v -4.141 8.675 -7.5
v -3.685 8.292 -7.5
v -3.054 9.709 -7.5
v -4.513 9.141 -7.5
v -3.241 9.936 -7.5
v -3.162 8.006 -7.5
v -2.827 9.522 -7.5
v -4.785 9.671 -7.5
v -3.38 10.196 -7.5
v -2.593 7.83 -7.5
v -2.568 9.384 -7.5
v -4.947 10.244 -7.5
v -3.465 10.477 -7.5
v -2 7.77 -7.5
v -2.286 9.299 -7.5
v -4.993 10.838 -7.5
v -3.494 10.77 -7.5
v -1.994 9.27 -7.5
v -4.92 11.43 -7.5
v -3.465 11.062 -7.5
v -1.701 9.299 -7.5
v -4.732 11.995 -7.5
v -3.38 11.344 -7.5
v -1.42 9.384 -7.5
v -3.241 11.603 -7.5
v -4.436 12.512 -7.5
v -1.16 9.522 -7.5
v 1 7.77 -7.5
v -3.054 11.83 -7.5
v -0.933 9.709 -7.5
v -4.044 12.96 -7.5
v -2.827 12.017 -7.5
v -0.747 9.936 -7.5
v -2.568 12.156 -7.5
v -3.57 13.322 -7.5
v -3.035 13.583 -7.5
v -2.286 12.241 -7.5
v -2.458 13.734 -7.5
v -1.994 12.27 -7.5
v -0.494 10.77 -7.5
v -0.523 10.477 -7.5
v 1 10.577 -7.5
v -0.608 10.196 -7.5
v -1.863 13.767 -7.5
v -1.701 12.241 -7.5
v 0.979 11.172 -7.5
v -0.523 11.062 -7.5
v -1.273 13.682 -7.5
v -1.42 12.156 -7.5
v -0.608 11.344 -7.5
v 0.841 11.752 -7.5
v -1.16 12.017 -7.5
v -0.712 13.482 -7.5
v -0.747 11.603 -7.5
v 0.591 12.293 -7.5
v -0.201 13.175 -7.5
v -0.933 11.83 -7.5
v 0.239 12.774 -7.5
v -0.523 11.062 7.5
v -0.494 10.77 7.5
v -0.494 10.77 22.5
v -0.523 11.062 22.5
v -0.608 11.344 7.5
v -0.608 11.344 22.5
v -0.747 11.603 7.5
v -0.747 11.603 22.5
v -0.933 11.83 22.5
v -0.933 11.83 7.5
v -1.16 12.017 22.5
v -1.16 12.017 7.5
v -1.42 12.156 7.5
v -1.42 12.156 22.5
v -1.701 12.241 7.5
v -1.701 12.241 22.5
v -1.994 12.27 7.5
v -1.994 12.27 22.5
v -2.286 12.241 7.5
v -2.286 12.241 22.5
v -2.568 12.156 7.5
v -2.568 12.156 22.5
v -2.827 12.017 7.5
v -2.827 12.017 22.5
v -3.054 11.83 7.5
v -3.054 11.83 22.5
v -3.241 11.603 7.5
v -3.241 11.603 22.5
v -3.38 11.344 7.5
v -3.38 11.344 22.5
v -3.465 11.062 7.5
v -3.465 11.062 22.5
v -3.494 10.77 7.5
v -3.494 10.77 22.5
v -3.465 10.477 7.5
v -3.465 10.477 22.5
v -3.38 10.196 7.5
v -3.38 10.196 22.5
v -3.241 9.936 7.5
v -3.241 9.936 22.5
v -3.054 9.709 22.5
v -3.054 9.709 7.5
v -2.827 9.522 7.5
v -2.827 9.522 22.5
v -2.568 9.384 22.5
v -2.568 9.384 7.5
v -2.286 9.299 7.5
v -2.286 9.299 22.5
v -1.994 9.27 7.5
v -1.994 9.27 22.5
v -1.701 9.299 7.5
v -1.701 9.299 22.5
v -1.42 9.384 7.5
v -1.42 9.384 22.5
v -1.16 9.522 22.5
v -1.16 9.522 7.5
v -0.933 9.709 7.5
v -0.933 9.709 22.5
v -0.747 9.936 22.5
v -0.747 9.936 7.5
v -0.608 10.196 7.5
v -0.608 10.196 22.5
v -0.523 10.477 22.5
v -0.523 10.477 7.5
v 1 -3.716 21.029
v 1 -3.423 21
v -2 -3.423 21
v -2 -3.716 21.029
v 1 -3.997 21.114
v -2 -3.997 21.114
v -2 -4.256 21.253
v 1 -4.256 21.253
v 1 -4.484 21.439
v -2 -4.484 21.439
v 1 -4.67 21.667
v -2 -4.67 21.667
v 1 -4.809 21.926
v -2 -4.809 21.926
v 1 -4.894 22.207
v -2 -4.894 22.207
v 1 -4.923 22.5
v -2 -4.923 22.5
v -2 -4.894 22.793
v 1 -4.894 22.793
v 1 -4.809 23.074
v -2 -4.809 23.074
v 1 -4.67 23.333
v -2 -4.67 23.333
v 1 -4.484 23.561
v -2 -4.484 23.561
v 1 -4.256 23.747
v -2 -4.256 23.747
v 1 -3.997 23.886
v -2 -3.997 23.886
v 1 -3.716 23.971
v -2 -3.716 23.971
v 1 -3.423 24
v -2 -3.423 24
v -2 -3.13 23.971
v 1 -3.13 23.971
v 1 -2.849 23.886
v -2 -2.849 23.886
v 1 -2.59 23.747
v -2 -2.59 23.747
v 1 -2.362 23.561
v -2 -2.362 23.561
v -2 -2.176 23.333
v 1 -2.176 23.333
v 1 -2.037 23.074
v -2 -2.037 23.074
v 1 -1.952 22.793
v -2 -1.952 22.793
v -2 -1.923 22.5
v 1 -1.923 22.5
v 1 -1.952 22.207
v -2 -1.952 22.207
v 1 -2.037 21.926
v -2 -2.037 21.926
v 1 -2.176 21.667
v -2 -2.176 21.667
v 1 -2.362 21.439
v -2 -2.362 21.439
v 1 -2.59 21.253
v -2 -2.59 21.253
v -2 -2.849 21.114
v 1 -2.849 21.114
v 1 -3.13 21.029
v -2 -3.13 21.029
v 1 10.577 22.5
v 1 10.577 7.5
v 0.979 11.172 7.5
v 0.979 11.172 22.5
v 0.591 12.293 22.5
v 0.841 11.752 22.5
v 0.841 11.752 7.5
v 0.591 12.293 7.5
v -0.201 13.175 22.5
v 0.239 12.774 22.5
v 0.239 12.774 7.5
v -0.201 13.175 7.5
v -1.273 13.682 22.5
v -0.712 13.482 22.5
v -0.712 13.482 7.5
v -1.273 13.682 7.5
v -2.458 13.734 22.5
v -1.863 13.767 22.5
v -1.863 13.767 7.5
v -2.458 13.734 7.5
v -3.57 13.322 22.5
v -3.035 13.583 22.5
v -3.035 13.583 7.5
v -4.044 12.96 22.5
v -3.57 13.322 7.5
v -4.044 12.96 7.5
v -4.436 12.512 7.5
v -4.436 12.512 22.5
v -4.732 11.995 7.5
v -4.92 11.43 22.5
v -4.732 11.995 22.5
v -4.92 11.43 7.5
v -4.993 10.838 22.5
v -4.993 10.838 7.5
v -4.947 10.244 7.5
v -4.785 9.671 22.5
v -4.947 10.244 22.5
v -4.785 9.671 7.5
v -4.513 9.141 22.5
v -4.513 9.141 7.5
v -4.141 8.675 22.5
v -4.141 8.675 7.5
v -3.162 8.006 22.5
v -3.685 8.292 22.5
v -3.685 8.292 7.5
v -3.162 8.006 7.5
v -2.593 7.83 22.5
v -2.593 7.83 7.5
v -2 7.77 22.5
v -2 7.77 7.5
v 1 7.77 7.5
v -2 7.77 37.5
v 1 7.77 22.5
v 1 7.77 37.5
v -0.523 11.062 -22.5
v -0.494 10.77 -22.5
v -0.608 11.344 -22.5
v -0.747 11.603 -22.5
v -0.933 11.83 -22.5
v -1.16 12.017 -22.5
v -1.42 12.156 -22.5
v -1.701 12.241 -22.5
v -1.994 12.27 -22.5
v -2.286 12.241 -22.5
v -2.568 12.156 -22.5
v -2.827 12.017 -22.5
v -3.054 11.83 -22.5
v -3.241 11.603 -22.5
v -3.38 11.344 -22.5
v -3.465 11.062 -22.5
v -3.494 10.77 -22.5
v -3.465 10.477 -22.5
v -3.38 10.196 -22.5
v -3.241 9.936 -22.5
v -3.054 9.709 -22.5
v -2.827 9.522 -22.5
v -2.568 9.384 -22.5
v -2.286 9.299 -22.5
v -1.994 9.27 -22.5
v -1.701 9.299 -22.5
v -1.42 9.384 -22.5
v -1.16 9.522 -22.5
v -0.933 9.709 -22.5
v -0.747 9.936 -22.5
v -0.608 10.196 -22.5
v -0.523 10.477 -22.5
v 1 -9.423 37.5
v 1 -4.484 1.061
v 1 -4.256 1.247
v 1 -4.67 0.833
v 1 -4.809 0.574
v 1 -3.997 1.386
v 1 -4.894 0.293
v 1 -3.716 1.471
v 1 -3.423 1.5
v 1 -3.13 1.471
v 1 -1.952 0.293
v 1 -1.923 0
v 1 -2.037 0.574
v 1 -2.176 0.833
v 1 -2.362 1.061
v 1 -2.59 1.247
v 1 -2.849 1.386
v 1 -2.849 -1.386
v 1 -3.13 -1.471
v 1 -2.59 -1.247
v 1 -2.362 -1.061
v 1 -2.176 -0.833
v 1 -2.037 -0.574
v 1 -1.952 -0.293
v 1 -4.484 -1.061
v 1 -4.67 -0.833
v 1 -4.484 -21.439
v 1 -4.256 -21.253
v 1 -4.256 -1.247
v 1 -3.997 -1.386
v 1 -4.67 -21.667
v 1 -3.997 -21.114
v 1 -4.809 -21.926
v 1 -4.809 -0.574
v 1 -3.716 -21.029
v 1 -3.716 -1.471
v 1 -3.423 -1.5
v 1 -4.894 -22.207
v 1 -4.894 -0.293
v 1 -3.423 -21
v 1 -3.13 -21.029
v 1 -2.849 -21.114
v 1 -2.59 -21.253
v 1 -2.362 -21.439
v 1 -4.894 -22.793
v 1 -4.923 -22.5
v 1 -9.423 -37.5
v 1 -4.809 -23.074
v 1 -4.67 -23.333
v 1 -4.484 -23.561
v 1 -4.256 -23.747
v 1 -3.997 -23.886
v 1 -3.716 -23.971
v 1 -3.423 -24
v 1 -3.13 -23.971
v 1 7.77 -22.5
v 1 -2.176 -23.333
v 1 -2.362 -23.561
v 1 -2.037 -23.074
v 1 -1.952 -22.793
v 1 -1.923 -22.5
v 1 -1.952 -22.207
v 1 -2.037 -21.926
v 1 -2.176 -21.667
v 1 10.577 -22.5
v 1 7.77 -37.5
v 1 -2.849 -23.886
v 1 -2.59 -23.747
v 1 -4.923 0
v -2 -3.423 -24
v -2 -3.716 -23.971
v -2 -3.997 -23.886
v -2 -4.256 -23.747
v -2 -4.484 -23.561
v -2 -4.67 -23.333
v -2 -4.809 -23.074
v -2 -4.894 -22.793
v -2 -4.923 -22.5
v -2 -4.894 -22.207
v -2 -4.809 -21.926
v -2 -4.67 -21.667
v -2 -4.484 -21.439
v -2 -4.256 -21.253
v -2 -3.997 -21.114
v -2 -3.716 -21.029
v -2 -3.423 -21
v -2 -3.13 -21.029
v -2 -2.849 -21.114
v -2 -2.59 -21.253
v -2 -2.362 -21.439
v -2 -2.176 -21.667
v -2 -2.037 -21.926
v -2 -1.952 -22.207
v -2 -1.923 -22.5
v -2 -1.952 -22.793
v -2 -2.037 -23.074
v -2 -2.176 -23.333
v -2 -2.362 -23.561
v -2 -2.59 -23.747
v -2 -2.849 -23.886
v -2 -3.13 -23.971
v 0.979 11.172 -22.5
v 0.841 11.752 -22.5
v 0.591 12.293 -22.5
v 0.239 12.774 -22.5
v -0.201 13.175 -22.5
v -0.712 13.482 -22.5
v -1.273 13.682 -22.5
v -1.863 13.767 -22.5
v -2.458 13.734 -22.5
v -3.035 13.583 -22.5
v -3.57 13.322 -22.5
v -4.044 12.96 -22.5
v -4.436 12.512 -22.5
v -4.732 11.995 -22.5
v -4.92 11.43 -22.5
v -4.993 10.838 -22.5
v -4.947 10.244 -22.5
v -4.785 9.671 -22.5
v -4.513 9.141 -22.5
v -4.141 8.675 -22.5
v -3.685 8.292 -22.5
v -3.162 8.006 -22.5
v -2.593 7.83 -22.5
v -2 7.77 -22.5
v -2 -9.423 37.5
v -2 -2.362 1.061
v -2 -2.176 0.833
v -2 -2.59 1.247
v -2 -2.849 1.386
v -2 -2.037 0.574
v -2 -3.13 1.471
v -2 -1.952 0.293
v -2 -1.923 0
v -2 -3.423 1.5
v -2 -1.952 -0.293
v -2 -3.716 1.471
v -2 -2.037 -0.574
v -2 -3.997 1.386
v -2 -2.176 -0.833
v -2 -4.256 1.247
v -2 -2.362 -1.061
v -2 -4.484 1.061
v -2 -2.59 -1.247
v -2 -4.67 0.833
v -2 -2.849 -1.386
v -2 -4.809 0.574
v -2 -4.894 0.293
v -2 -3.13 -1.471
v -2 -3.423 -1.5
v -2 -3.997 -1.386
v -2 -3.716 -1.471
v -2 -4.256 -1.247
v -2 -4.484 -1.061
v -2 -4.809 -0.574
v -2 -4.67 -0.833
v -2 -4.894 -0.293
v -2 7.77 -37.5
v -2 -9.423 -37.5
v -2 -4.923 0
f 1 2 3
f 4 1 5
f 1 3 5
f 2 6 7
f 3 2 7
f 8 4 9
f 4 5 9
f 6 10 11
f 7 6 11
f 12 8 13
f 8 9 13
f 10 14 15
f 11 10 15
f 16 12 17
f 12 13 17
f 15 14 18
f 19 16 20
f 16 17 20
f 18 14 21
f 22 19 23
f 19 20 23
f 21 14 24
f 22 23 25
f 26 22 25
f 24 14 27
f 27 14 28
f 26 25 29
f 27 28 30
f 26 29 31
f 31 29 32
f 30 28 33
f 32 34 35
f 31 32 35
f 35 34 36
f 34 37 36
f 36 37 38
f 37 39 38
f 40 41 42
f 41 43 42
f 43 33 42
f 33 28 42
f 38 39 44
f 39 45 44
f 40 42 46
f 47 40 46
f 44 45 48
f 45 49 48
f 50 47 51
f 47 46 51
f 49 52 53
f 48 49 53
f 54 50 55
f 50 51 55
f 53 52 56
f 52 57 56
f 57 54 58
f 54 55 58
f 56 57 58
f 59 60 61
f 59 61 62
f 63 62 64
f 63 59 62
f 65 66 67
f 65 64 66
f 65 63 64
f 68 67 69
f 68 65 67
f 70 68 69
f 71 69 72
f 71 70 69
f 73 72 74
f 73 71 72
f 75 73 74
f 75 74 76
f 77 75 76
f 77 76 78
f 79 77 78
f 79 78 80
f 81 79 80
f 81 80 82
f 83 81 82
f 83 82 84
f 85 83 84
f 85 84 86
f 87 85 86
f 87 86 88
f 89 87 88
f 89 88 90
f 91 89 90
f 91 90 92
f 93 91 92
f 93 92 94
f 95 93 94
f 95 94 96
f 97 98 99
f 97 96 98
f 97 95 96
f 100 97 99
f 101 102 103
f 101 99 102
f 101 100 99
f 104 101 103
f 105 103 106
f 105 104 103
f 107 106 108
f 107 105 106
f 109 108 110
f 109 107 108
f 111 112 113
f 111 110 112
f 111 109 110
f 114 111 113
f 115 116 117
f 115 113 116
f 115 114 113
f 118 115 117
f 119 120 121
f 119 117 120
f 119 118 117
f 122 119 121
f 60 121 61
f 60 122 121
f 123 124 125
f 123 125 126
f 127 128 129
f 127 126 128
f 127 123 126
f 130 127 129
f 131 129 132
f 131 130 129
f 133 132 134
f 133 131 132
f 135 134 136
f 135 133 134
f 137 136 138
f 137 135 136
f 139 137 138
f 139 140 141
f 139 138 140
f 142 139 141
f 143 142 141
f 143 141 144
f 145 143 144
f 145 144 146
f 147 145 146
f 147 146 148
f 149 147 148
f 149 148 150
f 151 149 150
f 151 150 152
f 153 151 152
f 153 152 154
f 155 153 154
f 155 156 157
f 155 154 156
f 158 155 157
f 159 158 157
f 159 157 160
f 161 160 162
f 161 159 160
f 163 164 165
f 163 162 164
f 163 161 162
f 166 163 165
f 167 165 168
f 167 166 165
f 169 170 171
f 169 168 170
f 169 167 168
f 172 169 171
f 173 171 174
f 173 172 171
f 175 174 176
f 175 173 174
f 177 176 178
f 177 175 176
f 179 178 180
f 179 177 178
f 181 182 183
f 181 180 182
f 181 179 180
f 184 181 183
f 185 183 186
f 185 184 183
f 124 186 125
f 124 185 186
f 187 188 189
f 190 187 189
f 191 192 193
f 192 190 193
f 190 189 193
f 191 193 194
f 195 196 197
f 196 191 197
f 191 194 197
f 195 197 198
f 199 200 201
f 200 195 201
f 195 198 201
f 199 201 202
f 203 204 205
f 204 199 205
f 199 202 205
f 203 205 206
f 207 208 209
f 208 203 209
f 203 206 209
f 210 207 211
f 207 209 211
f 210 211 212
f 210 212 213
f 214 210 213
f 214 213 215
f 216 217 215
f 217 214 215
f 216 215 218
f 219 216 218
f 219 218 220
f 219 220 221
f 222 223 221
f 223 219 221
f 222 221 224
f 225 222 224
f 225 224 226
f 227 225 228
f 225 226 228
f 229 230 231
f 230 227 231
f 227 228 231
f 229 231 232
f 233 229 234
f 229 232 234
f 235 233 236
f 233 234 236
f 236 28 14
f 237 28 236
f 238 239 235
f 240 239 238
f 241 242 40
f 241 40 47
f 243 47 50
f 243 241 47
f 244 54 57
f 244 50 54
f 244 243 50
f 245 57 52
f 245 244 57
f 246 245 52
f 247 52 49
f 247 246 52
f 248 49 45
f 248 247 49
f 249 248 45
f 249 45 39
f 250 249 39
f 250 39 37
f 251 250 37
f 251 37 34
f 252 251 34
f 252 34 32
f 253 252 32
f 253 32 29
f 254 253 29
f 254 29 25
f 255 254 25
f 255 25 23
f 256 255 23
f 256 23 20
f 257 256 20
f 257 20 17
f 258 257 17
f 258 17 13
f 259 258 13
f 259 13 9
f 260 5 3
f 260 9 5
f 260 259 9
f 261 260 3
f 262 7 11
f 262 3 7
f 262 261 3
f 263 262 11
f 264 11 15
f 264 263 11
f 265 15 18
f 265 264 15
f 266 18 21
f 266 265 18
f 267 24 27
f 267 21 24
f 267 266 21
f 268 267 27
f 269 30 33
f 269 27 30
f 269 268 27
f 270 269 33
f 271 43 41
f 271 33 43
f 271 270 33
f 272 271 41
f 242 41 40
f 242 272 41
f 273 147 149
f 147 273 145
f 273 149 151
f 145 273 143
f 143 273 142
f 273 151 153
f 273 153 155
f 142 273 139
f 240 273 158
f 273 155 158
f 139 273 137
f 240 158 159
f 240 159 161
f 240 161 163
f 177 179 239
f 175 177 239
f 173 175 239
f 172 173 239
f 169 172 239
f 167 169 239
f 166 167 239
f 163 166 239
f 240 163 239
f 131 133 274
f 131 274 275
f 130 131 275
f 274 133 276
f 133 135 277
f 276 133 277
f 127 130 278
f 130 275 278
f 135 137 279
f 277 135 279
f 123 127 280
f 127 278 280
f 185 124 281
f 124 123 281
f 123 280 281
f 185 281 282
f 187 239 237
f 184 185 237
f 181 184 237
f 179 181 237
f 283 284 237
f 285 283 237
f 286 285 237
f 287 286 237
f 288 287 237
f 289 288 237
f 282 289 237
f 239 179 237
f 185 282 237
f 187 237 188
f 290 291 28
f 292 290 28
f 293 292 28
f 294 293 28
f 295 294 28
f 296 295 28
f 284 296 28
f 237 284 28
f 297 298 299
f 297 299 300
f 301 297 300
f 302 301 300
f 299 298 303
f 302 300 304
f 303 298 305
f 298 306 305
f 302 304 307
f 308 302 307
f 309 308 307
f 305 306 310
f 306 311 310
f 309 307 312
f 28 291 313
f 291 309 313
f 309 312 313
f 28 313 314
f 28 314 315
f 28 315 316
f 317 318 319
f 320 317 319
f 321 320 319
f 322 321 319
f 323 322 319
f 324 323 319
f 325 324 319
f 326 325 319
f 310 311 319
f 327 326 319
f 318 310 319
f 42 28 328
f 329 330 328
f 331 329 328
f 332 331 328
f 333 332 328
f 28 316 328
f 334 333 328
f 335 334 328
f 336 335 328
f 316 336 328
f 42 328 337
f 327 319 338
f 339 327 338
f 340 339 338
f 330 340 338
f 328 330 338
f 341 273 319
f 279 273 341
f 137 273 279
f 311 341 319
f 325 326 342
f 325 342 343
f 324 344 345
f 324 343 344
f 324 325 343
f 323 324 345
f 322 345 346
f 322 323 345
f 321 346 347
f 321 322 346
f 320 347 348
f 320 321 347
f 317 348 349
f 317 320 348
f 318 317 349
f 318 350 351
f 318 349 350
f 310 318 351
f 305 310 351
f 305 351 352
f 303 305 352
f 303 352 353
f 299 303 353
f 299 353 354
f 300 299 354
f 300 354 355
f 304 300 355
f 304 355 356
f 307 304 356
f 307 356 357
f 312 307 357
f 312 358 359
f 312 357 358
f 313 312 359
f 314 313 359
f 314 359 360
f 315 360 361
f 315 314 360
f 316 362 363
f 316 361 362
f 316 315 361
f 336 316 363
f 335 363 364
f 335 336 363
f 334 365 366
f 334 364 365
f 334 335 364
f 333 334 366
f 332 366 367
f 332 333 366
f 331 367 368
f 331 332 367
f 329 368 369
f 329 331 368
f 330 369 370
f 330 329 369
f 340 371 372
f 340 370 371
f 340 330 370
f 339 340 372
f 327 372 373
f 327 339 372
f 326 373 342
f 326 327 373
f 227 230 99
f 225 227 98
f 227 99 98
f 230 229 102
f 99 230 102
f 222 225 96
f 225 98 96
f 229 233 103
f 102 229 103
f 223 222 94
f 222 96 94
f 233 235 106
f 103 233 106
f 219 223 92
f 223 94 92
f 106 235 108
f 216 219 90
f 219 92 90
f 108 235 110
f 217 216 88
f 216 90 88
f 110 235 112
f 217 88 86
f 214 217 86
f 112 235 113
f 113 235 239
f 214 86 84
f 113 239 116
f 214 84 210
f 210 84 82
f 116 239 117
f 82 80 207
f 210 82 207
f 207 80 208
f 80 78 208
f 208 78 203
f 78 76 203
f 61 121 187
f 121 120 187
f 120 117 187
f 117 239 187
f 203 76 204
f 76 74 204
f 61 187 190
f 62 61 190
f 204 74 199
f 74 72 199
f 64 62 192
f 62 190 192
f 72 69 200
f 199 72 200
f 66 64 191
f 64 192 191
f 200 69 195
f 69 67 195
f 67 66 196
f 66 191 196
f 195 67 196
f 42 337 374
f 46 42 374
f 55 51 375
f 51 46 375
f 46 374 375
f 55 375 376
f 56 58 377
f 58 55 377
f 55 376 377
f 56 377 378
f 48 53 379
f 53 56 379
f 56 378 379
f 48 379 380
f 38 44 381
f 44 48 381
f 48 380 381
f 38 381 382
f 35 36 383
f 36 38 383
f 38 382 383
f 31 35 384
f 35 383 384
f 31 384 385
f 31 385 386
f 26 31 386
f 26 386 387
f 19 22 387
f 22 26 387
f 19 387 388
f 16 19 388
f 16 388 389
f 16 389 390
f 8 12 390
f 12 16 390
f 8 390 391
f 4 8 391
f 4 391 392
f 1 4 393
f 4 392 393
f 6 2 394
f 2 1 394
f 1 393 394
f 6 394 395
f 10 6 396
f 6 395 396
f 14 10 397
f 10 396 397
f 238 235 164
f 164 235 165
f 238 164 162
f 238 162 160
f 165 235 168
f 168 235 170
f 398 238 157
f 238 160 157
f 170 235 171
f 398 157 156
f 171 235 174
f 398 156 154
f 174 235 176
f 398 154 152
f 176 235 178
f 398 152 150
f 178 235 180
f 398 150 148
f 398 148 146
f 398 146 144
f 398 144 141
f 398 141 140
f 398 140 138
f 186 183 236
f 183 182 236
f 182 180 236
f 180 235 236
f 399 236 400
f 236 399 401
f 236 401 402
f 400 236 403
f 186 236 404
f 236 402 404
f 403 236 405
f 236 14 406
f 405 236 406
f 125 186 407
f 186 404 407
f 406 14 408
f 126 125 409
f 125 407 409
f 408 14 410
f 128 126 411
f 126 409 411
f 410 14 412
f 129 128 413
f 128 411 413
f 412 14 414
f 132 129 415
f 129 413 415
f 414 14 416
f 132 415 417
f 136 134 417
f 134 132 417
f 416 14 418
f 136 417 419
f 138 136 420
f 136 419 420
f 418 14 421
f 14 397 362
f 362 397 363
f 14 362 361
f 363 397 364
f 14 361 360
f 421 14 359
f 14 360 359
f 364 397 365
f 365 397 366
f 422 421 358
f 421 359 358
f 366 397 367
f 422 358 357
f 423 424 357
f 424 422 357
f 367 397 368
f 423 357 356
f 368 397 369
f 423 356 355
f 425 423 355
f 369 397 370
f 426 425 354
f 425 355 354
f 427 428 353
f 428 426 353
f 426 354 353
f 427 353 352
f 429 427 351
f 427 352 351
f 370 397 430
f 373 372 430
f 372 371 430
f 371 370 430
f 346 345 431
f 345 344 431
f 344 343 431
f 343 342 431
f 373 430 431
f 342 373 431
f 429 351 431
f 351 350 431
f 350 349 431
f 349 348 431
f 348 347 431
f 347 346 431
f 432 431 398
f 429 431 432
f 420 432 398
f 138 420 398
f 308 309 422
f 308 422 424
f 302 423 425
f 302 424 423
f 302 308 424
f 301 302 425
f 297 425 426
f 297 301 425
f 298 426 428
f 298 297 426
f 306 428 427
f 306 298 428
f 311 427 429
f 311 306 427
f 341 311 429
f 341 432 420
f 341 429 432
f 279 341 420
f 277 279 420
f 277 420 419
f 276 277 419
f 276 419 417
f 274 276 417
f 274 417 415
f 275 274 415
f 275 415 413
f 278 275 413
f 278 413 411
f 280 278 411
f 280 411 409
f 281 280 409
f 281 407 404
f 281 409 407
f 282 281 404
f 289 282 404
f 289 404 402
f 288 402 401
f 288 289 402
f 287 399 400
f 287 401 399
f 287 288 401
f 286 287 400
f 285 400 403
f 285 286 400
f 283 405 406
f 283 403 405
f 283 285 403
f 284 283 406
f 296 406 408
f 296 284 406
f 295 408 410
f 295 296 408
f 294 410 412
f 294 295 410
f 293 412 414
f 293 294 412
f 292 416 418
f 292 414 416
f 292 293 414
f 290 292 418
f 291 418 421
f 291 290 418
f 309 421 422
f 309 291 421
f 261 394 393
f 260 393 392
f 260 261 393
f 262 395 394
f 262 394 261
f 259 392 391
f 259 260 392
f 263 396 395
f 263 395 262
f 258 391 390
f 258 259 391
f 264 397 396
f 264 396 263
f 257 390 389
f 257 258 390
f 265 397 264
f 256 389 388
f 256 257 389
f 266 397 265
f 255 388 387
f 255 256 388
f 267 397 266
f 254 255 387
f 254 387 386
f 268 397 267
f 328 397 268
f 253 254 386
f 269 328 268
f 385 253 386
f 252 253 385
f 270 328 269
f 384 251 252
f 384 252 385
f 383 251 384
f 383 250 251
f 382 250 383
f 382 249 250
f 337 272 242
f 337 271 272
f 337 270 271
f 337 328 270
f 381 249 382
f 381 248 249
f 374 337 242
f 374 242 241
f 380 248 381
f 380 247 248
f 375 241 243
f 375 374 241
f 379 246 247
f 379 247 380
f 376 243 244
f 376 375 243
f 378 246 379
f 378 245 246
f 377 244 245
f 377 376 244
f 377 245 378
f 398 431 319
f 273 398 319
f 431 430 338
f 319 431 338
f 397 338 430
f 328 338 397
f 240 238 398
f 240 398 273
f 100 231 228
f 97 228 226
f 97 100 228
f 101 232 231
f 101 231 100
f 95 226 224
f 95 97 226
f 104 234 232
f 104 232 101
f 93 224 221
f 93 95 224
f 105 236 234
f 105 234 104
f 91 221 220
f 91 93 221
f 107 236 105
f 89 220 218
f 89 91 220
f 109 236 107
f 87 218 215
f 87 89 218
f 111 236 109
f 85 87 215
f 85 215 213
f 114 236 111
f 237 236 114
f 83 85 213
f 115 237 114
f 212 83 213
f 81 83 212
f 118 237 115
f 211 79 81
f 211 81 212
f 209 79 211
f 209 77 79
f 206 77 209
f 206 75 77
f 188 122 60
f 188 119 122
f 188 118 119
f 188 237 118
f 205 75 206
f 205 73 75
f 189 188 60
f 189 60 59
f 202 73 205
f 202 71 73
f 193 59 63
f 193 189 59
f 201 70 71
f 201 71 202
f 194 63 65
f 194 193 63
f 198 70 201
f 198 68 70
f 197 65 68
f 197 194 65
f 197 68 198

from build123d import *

# Parameters (mm, degrees)
BOSS_EXTRUDE1_DEPTH      = 37.5
BOSS_EXTRUDE1_DEPTH_BACK = 37.5
SKETCH1_R                = 1.5
CUT_EXTRUDE1_DEPTH       = 37.5
CUT_EXTRUDE1_DEPTH_BACK  = 37.5
SKETCH2_R                = 1.5
SKETCH2_W                = 15
SKETCH2_H                = 15


with BuildPart() as part:
    # Sketch1 → Boss-Extrude1 (new, two sides: drawn at the far end of the back side and taken through both)
    with BuildSketch(Plane.XY.offset(-BOSS_EXTRUDE1_DEPTH_BACK)):
        with BuildLine():
            Line((-2, 7.769691362), (-2, -9.423076923))
            Line((-2, -9.423076923), (1, -9.423076923))
            Line((1, -9.423076923), (1, 10.576923077))
            ThreePointArc((1, 10.576923077), (-4.043575876, 12.960215003), (-2, 7.769691362))
        make_face()
        with Locations((-1.993800738, 10.769684957)):
            Circle(SKETCH1_R, mode=Mode.SUBTRACT)
    extrude(amount=BOSS_EXTRUDE1_DEPTH + BOSS_EXTRUDE1_DEPTH_BACK)

    # Sketch2 → Cut-Extrude1 (cut, two sides: drawn at the far end of the back side and taken through both)
    with BuildSketch(Plane.ZY.offset(2).offset(-CUT_EXTRUDE1_DEPTH_BACK)):
        with Locations((-22.5, -3.423076923)):
            Circle(SKETCH2_R)
        with Locations((0, -3.423076923)):
            Circle(SKETCH2_R)
        with Locations((22.5, -3.423076923)):
            Circle(SKETCH2_R)
        with Locations((-30, 15.269691362)):
            Rectangle(SKETCH2_W, SKETCH2_H)
        with Locations((0, 15.269691362)):
            Rectangle(SKETCH2_W, SKETCH2_H)
        with Locations((30, 15.269691362)):
            Rectangle(SKETCH2_W, SKETCH2_H)
    extrude(amount=CUT_EXTRUDE1_DEPTH + CUT_EXTRUDE1_DEPTH_BACK, mode=Mode.SUBTRACT)


solid = part.part
